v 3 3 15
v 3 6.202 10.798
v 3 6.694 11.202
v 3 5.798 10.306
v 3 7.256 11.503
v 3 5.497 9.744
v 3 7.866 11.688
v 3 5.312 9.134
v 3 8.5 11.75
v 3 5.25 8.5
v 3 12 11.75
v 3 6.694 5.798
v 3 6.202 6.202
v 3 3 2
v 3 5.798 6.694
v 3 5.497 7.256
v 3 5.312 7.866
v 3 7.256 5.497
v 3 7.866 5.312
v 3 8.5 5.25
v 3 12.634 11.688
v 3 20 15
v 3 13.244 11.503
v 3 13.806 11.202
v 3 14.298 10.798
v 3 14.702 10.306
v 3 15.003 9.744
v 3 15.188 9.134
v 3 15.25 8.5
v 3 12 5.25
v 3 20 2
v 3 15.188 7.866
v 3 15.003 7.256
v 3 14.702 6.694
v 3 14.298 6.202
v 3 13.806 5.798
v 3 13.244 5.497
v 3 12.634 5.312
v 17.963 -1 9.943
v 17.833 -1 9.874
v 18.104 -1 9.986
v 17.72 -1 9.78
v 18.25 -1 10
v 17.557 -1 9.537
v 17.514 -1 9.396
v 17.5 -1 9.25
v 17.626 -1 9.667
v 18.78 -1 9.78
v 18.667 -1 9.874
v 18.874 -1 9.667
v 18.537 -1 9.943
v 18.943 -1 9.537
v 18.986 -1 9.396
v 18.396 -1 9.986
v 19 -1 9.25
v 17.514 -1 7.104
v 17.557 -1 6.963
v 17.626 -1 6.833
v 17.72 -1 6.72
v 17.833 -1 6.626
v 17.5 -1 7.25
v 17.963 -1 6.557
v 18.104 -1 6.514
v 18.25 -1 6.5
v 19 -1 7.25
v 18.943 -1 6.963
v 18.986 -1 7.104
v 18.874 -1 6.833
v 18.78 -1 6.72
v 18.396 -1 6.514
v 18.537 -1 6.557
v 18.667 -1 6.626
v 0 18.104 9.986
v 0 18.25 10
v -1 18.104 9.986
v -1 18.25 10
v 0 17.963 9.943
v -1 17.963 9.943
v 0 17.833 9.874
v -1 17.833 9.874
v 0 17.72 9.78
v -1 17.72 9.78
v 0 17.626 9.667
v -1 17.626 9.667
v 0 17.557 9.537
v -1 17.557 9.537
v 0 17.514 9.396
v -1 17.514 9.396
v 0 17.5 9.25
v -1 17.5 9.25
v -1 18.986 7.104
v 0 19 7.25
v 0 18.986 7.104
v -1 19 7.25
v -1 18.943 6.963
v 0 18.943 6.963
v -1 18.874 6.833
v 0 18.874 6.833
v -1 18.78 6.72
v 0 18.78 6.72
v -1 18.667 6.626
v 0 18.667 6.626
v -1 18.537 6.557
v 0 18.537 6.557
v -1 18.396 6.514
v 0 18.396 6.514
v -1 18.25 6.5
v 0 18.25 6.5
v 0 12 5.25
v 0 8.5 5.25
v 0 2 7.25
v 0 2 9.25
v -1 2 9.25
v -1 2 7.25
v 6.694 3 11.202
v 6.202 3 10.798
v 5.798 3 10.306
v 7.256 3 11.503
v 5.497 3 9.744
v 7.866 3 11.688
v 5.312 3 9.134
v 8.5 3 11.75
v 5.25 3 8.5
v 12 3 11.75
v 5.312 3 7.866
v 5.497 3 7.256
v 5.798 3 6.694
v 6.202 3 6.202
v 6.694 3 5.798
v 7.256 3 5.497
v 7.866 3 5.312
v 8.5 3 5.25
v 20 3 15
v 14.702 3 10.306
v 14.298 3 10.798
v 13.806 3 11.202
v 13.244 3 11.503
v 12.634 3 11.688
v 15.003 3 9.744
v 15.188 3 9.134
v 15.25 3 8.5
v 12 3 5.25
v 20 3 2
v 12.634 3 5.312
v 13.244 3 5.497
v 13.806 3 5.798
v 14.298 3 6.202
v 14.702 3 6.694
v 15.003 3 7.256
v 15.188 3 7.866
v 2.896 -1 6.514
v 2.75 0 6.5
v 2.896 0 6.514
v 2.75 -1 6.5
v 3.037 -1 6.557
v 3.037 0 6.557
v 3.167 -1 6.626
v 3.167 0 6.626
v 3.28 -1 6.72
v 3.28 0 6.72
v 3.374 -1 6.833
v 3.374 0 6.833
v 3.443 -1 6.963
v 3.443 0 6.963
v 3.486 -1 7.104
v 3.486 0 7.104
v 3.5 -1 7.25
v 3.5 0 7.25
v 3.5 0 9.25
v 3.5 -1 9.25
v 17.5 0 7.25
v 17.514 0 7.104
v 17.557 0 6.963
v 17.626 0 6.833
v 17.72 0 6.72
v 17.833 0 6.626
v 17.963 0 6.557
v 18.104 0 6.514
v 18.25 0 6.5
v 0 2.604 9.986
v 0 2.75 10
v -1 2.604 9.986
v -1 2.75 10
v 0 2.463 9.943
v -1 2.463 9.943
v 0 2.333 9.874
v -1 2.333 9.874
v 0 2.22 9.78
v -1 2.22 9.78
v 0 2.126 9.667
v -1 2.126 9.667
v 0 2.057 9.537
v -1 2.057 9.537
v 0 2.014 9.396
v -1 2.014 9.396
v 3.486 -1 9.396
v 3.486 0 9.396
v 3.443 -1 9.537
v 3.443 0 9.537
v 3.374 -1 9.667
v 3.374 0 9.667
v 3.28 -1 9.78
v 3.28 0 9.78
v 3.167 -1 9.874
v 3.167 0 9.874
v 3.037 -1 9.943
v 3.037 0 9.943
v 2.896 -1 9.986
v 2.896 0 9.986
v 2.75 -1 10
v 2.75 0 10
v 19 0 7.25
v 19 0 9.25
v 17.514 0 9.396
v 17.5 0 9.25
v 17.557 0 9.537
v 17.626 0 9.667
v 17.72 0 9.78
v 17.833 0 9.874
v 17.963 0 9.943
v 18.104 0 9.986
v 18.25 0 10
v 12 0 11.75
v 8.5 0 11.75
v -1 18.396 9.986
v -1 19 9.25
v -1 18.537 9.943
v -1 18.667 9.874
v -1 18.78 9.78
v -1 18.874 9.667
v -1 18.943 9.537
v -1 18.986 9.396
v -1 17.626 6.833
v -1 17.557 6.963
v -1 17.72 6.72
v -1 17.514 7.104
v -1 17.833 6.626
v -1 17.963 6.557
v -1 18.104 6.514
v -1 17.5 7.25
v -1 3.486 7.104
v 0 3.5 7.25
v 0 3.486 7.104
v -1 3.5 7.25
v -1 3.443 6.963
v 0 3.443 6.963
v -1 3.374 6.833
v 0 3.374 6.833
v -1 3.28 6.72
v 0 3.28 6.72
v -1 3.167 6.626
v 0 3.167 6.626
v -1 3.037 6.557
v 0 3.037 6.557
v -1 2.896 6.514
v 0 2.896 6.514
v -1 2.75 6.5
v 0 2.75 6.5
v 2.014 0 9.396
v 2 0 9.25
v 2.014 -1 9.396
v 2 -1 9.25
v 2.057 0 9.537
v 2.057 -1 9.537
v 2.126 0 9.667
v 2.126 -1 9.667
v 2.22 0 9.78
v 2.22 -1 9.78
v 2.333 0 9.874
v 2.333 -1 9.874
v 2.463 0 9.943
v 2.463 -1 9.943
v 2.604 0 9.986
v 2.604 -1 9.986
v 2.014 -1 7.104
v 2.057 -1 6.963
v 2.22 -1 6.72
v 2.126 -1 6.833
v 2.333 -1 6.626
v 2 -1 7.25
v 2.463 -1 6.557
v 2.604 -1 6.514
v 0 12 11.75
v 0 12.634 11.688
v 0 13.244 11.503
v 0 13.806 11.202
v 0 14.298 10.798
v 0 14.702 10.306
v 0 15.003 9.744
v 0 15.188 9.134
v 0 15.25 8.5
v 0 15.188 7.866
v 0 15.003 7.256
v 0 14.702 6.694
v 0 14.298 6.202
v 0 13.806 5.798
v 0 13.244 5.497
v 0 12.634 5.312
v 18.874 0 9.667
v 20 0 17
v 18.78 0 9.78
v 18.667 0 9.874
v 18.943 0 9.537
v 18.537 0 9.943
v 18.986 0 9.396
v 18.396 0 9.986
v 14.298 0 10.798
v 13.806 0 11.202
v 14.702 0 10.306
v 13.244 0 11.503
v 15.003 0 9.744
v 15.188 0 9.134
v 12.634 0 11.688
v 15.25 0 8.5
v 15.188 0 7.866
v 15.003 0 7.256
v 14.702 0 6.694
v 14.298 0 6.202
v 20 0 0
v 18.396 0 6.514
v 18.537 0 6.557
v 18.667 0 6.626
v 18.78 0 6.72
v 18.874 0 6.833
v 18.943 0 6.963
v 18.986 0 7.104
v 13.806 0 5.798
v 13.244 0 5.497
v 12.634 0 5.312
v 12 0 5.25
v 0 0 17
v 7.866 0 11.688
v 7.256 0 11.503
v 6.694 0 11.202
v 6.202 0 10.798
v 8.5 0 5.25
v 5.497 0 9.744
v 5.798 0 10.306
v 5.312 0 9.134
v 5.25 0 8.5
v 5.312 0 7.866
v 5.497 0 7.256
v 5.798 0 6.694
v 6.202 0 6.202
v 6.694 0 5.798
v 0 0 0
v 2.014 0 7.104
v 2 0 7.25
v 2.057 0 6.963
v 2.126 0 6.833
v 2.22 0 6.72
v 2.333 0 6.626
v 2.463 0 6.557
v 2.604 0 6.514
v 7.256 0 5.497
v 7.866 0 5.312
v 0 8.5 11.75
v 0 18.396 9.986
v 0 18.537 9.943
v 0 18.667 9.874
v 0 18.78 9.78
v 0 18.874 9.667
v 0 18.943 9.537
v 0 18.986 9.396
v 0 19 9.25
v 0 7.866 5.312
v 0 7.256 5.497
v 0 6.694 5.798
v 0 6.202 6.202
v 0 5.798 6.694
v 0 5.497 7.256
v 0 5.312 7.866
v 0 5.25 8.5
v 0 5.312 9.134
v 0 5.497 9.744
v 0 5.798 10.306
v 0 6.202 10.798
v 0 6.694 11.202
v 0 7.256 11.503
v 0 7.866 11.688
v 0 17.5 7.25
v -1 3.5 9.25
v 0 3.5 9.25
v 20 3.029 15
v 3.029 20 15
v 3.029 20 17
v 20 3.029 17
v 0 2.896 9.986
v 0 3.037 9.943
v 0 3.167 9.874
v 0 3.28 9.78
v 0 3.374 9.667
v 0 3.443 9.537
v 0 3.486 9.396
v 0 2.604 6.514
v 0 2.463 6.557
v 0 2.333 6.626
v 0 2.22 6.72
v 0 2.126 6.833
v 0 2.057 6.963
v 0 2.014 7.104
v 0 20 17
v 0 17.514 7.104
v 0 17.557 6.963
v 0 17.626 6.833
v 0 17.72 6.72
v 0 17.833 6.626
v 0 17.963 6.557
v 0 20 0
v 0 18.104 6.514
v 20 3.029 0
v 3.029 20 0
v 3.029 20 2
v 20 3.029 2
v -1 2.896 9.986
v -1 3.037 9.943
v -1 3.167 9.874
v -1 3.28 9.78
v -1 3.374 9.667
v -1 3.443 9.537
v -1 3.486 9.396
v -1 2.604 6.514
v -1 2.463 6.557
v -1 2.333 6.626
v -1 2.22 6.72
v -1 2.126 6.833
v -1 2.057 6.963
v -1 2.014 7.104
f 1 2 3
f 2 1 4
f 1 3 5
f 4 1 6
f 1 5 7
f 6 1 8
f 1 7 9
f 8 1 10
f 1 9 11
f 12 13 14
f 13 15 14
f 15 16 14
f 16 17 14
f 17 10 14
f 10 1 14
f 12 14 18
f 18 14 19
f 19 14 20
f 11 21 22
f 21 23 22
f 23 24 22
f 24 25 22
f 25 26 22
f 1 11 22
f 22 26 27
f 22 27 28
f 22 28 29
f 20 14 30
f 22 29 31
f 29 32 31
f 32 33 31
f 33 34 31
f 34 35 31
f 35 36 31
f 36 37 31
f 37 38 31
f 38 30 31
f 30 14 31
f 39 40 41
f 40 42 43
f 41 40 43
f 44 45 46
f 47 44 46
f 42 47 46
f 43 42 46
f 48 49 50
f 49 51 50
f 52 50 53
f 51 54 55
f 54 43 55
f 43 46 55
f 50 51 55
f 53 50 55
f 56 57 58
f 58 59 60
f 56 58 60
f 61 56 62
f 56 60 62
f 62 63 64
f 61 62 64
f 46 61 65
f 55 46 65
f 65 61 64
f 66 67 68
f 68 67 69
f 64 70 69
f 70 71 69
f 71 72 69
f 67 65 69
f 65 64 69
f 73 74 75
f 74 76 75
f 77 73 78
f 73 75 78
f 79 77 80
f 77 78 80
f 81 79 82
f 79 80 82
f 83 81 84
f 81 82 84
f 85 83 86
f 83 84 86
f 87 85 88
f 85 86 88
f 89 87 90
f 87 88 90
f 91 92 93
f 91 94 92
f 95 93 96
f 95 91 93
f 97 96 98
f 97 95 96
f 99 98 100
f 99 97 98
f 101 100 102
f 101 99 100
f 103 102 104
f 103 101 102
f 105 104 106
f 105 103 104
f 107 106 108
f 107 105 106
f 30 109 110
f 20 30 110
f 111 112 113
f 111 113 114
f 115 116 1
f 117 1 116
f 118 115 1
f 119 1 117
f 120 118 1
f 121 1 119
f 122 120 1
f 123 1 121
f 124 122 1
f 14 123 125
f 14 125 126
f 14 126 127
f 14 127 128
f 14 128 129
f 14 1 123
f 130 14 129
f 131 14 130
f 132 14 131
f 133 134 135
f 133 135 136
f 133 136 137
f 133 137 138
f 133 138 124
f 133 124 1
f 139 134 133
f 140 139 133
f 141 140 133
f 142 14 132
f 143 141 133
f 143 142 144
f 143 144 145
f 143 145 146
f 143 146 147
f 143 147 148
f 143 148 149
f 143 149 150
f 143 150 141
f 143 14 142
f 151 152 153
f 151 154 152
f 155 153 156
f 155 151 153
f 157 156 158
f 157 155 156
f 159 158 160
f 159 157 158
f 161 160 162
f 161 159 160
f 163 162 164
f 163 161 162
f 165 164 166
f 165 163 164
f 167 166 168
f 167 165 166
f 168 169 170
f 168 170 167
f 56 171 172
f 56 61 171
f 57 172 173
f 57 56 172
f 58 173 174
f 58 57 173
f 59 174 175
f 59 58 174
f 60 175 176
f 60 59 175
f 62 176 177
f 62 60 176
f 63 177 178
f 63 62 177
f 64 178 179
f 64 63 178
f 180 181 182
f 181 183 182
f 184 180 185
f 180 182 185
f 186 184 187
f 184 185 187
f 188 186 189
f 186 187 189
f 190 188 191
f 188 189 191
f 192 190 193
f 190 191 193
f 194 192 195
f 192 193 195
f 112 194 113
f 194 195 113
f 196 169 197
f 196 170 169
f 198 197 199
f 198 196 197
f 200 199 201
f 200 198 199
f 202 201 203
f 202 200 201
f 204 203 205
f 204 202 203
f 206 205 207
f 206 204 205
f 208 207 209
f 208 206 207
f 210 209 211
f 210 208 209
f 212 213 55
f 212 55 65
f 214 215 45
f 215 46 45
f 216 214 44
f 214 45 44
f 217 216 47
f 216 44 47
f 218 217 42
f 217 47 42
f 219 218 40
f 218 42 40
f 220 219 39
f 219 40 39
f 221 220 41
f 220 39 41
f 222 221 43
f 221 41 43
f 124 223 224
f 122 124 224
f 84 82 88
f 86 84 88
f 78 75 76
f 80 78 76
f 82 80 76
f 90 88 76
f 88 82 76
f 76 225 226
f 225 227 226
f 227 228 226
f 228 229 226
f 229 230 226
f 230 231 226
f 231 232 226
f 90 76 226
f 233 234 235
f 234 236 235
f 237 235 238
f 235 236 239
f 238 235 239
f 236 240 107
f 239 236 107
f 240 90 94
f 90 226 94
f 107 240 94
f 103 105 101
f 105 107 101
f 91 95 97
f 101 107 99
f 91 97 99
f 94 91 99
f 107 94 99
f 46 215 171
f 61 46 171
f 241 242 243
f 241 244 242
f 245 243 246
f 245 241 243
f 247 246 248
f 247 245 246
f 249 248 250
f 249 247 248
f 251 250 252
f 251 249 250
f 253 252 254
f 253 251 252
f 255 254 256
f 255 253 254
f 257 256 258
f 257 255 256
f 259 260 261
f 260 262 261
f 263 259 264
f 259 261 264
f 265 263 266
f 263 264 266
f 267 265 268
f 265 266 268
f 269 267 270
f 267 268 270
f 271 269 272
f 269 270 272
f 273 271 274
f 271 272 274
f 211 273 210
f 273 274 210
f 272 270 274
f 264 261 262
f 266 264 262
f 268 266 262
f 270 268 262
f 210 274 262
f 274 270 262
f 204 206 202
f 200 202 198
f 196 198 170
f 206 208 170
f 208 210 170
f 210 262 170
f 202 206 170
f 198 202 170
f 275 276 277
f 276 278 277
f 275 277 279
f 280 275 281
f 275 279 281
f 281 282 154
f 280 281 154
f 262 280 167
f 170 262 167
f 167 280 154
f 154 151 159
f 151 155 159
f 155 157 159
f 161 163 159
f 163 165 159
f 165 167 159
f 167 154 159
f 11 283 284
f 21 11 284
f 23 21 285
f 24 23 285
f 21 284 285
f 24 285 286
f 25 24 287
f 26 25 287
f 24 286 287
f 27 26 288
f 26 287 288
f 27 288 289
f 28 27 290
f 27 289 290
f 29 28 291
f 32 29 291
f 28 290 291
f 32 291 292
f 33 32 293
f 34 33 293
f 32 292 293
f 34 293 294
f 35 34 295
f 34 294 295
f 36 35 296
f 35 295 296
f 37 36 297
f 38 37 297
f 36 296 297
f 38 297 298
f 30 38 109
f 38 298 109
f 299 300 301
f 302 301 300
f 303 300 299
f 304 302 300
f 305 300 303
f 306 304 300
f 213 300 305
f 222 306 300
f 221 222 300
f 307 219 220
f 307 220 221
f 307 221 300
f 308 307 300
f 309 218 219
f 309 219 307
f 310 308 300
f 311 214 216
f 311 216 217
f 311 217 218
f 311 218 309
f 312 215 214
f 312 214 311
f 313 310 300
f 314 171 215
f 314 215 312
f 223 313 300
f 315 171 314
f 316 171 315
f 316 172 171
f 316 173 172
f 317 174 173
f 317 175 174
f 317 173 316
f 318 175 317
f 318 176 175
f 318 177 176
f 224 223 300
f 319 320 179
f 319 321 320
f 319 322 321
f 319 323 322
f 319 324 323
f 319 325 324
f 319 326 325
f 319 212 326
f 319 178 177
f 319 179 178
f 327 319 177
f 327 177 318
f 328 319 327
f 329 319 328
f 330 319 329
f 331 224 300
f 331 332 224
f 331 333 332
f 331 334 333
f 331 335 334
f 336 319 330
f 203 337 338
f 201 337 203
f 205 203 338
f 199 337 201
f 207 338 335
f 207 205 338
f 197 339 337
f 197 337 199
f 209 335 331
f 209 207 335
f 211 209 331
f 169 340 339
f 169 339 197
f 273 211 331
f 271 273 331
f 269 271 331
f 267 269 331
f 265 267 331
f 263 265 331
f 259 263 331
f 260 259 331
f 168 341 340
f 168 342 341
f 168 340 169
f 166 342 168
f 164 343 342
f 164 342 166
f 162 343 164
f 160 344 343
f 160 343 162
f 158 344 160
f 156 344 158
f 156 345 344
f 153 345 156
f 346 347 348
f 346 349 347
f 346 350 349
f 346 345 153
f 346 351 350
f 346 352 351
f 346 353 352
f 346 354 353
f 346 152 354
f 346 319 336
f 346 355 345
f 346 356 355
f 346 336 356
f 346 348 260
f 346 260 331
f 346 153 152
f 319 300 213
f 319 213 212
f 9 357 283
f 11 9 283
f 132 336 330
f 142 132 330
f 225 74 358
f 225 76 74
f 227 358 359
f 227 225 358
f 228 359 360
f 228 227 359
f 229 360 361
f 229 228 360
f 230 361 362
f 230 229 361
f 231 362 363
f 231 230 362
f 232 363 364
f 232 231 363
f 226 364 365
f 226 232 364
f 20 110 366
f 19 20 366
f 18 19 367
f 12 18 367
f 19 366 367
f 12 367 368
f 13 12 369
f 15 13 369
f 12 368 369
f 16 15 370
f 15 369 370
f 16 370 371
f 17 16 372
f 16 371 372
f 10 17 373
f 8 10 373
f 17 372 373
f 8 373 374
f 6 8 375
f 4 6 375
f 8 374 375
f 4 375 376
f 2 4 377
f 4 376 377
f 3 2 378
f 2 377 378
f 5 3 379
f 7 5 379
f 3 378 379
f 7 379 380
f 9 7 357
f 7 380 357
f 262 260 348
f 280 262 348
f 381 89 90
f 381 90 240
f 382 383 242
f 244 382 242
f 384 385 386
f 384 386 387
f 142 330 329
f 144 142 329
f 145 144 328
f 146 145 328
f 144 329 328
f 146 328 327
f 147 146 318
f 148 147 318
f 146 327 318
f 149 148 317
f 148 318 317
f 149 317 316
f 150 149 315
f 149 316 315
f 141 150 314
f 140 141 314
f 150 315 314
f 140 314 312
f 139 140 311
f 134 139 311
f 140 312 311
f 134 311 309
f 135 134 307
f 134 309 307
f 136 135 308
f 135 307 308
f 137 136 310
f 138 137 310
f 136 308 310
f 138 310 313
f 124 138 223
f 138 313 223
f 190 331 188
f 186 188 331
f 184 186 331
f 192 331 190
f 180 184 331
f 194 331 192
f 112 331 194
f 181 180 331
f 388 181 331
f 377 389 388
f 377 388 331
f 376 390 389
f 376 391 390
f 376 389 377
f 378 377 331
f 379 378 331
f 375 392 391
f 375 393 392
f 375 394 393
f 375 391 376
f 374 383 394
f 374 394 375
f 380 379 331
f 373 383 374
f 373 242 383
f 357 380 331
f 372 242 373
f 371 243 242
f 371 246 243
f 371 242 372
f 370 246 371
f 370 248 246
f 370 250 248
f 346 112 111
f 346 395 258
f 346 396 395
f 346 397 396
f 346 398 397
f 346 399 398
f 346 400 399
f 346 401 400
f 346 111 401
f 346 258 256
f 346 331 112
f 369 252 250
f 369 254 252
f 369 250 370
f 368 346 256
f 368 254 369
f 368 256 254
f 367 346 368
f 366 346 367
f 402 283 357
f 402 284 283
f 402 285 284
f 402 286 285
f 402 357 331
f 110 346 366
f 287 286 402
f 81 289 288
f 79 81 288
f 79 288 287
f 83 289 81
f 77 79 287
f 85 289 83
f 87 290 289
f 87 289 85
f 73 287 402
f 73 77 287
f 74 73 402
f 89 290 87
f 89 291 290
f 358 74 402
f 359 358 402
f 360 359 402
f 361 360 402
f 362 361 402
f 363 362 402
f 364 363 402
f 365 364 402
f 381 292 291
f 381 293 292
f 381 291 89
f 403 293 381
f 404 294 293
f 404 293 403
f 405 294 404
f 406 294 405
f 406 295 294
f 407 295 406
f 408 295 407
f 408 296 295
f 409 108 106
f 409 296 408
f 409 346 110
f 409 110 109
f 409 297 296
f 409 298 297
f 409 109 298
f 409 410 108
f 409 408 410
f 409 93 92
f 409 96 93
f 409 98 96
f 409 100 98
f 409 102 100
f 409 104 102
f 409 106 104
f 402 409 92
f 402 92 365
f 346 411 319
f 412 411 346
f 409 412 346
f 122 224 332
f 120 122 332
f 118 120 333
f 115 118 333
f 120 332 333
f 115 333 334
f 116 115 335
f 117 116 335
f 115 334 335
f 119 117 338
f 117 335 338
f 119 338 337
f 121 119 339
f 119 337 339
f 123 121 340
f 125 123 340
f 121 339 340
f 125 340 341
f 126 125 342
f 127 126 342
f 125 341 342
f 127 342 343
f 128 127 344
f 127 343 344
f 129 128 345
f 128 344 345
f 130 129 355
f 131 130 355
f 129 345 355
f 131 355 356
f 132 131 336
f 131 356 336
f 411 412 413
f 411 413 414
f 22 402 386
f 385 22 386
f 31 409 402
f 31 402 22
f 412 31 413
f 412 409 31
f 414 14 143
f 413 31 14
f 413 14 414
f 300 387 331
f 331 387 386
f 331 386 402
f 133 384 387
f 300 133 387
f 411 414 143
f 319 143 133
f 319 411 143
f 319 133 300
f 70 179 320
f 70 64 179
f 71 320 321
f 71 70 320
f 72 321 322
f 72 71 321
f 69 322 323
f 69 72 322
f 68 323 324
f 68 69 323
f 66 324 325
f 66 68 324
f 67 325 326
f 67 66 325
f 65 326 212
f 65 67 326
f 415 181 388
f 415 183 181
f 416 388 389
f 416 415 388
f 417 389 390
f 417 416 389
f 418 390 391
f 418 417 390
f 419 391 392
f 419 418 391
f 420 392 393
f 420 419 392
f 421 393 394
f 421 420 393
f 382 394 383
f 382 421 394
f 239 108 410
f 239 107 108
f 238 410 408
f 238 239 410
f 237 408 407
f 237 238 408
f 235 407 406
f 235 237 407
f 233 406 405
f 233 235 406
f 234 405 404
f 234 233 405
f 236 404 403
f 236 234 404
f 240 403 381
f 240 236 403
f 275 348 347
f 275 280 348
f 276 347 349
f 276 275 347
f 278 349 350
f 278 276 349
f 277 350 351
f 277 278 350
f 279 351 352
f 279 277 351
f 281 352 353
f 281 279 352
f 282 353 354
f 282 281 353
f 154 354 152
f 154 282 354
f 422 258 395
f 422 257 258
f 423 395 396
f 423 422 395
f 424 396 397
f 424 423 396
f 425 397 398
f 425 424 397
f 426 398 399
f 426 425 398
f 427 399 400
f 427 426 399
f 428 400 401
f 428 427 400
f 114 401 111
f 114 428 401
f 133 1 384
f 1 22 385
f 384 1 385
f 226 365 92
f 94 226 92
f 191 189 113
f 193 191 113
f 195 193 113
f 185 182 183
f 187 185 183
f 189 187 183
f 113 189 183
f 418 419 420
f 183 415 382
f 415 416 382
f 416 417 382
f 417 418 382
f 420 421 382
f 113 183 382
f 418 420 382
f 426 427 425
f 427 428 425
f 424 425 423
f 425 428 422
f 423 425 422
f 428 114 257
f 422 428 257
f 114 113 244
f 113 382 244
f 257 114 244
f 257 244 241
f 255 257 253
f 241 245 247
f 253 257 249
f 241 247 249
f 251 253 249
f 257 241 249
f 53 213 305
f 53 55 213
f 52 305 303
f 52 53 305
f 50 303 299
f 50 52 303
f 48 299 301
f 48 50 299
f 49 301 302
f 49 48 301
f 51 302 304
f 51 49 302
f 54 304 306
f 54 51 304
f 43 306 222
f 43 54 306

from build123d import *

# Parameters (mm, degrees)
BOSS_EXTRUDE1_DEPTH = 17
SKETCH2_W           = 17
SKETCH2_H           = 17
CUT_EXTRUDE1_DEPTH  = 13
CUT_EXTRUDE2_DEPTH  = 13
SKETCH6_W           = 3.5
SKETCH6_H           = 1.5
BOSS_EXTRUDE2_DEPTH = 1
FILLET1_R           = 0.75
SKETCH7_W           = 1.5
SKETCH7_H           = 3.5
BOSS_EXTRUDE3_DEPTH = 1
FILLET2_R           = 0.75
CUT_EXTRUDE3_DEPTH  = 10


with BuildPart() as part:
    # Sketch1 → Boss-Extrude1 (new body)
    with BuildSketch(Plane.XY):
        Polygon((0, 0), (0, 20), (3.029437252, 20), (20, 3.029437252), (20, 0), align=None)
    extrude(amount=BOSS_EXTRUDE1_DEPTH)

    # Sketch2 → Cut-Extrude1 (cut)
    with BuildSketch(Plane.XY.offset(2)):
        with Locations((11.5, 11.5)):
            Rectangle(SKETCH2_W, SKETCH2_H)
    extrude(amount=CUT_EXTRUDE1_DEPTH, mode=Mode.SUBTRACT)

    # Sketch3 → Cut-Extrude2 (cut)
    with BuildSketch(Plane(origin=(0, 0, 0), x_dir=(1, 0, 0), z_dir=(0, 1, 0))):
        with BuildLine():
            Line((8.5, -5.25), (12, -5.25))
            ThreePointArc((12, -5.25), (15.25, -8.5), (12, -11.75))
            Line((12, -11.75), (8.5, -11.75))
            ThreePointArc((8.5, -11.75), (5.25, -8.5), (8.5, -5.25))
        make_face()
    extrude(amount=CUT_EXTRUDE2_DEPTH, mode=Mode.SUBTRACT)

    # Sketch6 → Boss-Extrude2 (add)
    with BuildSketch(Plane(origin=(0, 0, 0), x_dir=(0, 0, -1), z_dir=(1, 0, 0))):
        with Locations((-8.25, 18.25)):
            Rectangle(SKETCH6_W, SKETCH6_H)
        with Locations((-8.25, 2.75)):
            Rectangle(SKETCH6_W, SKETCH6_H)
    extrude(amount=-BOSS_EXTRUDE2_DEPTH)

    # Fillet1
    fillet1_edges = [part.edges().sort_by_distance(p)[0] for p in [
        (-0.5, 2, 6.5),
        (-0.5, 17.5, 6.5),
        (-0.5, 2, 10),
        (-0.5, 3.5, 10),
        (-0.5, 3.5, 6.5),
        (-0.5, 17.5, 10),
        (-0.5, 19, 10),
        (-0.5, 19, 6.5),
    ]]
    fillet(fillet1_edges, radius=FILLET1_R - 0.0001)  # a hair under: the kernel refuses the full size

    # Sketch7 → Boss-Extrude3 (add)
    with BuildSketch(Plane(origin=(0, 0, 0), x_dir=(1, 0, 0), z_dir=(0, 1, 0))):
        with Locations((2.75, -8.25)):
            Rectangle(SKETCH7_W, SKETCH7_H)
        with Locations((18.25, -8.25)):
            Rectangle(SKETCH7_W, SKETCH7_H)
    extrude(amount=-BOSS_EXTRUDE3_DEPTH)

    # Fillet2
    fillet2_edges = [part.edges().sort_by_distance(p)[0] for p in [
        (3.5, -0.5, 6.5),
        (2, -0.5, 6.5),
        (2, -0.5, 10),
        (3.5, -0.5, 10),
        (17.5, -0.5, 10),
        (19, -0.5, 10),
        (17.5, -0.5, 6.5),
        (19, -0.5, 6.5),
    ]]
    fillet(fillet2_edges, radius=FILLET2_R - 0.0001)  # a hair under: the kernel refuses the full size

    # Sketch8 → Cut-Extrude3 (cut)
    with BuildSketch(Plane(origin=(0, 0, 0), x_dir=(0, 0, -1), z_dir=(1, 0, 0))):
        with BuildLine():
            Line((-11.75, 8.5), (-11.75, 12))
            ThreePointArc((-11.75, 12), (-8.5, 15.25), (-5.25, 12))
            Line((-5.25, 12), (-5.25, 8.5))
            ThreePointArc((-5.25, 8.5), (-8.5, 5.25), (-11.75, 8.5))
        make_face()
    extrude(amount=CUT_EXTRUDE3_DEPTH, mode=Mode.SUBTRACT)


solid = part.part
